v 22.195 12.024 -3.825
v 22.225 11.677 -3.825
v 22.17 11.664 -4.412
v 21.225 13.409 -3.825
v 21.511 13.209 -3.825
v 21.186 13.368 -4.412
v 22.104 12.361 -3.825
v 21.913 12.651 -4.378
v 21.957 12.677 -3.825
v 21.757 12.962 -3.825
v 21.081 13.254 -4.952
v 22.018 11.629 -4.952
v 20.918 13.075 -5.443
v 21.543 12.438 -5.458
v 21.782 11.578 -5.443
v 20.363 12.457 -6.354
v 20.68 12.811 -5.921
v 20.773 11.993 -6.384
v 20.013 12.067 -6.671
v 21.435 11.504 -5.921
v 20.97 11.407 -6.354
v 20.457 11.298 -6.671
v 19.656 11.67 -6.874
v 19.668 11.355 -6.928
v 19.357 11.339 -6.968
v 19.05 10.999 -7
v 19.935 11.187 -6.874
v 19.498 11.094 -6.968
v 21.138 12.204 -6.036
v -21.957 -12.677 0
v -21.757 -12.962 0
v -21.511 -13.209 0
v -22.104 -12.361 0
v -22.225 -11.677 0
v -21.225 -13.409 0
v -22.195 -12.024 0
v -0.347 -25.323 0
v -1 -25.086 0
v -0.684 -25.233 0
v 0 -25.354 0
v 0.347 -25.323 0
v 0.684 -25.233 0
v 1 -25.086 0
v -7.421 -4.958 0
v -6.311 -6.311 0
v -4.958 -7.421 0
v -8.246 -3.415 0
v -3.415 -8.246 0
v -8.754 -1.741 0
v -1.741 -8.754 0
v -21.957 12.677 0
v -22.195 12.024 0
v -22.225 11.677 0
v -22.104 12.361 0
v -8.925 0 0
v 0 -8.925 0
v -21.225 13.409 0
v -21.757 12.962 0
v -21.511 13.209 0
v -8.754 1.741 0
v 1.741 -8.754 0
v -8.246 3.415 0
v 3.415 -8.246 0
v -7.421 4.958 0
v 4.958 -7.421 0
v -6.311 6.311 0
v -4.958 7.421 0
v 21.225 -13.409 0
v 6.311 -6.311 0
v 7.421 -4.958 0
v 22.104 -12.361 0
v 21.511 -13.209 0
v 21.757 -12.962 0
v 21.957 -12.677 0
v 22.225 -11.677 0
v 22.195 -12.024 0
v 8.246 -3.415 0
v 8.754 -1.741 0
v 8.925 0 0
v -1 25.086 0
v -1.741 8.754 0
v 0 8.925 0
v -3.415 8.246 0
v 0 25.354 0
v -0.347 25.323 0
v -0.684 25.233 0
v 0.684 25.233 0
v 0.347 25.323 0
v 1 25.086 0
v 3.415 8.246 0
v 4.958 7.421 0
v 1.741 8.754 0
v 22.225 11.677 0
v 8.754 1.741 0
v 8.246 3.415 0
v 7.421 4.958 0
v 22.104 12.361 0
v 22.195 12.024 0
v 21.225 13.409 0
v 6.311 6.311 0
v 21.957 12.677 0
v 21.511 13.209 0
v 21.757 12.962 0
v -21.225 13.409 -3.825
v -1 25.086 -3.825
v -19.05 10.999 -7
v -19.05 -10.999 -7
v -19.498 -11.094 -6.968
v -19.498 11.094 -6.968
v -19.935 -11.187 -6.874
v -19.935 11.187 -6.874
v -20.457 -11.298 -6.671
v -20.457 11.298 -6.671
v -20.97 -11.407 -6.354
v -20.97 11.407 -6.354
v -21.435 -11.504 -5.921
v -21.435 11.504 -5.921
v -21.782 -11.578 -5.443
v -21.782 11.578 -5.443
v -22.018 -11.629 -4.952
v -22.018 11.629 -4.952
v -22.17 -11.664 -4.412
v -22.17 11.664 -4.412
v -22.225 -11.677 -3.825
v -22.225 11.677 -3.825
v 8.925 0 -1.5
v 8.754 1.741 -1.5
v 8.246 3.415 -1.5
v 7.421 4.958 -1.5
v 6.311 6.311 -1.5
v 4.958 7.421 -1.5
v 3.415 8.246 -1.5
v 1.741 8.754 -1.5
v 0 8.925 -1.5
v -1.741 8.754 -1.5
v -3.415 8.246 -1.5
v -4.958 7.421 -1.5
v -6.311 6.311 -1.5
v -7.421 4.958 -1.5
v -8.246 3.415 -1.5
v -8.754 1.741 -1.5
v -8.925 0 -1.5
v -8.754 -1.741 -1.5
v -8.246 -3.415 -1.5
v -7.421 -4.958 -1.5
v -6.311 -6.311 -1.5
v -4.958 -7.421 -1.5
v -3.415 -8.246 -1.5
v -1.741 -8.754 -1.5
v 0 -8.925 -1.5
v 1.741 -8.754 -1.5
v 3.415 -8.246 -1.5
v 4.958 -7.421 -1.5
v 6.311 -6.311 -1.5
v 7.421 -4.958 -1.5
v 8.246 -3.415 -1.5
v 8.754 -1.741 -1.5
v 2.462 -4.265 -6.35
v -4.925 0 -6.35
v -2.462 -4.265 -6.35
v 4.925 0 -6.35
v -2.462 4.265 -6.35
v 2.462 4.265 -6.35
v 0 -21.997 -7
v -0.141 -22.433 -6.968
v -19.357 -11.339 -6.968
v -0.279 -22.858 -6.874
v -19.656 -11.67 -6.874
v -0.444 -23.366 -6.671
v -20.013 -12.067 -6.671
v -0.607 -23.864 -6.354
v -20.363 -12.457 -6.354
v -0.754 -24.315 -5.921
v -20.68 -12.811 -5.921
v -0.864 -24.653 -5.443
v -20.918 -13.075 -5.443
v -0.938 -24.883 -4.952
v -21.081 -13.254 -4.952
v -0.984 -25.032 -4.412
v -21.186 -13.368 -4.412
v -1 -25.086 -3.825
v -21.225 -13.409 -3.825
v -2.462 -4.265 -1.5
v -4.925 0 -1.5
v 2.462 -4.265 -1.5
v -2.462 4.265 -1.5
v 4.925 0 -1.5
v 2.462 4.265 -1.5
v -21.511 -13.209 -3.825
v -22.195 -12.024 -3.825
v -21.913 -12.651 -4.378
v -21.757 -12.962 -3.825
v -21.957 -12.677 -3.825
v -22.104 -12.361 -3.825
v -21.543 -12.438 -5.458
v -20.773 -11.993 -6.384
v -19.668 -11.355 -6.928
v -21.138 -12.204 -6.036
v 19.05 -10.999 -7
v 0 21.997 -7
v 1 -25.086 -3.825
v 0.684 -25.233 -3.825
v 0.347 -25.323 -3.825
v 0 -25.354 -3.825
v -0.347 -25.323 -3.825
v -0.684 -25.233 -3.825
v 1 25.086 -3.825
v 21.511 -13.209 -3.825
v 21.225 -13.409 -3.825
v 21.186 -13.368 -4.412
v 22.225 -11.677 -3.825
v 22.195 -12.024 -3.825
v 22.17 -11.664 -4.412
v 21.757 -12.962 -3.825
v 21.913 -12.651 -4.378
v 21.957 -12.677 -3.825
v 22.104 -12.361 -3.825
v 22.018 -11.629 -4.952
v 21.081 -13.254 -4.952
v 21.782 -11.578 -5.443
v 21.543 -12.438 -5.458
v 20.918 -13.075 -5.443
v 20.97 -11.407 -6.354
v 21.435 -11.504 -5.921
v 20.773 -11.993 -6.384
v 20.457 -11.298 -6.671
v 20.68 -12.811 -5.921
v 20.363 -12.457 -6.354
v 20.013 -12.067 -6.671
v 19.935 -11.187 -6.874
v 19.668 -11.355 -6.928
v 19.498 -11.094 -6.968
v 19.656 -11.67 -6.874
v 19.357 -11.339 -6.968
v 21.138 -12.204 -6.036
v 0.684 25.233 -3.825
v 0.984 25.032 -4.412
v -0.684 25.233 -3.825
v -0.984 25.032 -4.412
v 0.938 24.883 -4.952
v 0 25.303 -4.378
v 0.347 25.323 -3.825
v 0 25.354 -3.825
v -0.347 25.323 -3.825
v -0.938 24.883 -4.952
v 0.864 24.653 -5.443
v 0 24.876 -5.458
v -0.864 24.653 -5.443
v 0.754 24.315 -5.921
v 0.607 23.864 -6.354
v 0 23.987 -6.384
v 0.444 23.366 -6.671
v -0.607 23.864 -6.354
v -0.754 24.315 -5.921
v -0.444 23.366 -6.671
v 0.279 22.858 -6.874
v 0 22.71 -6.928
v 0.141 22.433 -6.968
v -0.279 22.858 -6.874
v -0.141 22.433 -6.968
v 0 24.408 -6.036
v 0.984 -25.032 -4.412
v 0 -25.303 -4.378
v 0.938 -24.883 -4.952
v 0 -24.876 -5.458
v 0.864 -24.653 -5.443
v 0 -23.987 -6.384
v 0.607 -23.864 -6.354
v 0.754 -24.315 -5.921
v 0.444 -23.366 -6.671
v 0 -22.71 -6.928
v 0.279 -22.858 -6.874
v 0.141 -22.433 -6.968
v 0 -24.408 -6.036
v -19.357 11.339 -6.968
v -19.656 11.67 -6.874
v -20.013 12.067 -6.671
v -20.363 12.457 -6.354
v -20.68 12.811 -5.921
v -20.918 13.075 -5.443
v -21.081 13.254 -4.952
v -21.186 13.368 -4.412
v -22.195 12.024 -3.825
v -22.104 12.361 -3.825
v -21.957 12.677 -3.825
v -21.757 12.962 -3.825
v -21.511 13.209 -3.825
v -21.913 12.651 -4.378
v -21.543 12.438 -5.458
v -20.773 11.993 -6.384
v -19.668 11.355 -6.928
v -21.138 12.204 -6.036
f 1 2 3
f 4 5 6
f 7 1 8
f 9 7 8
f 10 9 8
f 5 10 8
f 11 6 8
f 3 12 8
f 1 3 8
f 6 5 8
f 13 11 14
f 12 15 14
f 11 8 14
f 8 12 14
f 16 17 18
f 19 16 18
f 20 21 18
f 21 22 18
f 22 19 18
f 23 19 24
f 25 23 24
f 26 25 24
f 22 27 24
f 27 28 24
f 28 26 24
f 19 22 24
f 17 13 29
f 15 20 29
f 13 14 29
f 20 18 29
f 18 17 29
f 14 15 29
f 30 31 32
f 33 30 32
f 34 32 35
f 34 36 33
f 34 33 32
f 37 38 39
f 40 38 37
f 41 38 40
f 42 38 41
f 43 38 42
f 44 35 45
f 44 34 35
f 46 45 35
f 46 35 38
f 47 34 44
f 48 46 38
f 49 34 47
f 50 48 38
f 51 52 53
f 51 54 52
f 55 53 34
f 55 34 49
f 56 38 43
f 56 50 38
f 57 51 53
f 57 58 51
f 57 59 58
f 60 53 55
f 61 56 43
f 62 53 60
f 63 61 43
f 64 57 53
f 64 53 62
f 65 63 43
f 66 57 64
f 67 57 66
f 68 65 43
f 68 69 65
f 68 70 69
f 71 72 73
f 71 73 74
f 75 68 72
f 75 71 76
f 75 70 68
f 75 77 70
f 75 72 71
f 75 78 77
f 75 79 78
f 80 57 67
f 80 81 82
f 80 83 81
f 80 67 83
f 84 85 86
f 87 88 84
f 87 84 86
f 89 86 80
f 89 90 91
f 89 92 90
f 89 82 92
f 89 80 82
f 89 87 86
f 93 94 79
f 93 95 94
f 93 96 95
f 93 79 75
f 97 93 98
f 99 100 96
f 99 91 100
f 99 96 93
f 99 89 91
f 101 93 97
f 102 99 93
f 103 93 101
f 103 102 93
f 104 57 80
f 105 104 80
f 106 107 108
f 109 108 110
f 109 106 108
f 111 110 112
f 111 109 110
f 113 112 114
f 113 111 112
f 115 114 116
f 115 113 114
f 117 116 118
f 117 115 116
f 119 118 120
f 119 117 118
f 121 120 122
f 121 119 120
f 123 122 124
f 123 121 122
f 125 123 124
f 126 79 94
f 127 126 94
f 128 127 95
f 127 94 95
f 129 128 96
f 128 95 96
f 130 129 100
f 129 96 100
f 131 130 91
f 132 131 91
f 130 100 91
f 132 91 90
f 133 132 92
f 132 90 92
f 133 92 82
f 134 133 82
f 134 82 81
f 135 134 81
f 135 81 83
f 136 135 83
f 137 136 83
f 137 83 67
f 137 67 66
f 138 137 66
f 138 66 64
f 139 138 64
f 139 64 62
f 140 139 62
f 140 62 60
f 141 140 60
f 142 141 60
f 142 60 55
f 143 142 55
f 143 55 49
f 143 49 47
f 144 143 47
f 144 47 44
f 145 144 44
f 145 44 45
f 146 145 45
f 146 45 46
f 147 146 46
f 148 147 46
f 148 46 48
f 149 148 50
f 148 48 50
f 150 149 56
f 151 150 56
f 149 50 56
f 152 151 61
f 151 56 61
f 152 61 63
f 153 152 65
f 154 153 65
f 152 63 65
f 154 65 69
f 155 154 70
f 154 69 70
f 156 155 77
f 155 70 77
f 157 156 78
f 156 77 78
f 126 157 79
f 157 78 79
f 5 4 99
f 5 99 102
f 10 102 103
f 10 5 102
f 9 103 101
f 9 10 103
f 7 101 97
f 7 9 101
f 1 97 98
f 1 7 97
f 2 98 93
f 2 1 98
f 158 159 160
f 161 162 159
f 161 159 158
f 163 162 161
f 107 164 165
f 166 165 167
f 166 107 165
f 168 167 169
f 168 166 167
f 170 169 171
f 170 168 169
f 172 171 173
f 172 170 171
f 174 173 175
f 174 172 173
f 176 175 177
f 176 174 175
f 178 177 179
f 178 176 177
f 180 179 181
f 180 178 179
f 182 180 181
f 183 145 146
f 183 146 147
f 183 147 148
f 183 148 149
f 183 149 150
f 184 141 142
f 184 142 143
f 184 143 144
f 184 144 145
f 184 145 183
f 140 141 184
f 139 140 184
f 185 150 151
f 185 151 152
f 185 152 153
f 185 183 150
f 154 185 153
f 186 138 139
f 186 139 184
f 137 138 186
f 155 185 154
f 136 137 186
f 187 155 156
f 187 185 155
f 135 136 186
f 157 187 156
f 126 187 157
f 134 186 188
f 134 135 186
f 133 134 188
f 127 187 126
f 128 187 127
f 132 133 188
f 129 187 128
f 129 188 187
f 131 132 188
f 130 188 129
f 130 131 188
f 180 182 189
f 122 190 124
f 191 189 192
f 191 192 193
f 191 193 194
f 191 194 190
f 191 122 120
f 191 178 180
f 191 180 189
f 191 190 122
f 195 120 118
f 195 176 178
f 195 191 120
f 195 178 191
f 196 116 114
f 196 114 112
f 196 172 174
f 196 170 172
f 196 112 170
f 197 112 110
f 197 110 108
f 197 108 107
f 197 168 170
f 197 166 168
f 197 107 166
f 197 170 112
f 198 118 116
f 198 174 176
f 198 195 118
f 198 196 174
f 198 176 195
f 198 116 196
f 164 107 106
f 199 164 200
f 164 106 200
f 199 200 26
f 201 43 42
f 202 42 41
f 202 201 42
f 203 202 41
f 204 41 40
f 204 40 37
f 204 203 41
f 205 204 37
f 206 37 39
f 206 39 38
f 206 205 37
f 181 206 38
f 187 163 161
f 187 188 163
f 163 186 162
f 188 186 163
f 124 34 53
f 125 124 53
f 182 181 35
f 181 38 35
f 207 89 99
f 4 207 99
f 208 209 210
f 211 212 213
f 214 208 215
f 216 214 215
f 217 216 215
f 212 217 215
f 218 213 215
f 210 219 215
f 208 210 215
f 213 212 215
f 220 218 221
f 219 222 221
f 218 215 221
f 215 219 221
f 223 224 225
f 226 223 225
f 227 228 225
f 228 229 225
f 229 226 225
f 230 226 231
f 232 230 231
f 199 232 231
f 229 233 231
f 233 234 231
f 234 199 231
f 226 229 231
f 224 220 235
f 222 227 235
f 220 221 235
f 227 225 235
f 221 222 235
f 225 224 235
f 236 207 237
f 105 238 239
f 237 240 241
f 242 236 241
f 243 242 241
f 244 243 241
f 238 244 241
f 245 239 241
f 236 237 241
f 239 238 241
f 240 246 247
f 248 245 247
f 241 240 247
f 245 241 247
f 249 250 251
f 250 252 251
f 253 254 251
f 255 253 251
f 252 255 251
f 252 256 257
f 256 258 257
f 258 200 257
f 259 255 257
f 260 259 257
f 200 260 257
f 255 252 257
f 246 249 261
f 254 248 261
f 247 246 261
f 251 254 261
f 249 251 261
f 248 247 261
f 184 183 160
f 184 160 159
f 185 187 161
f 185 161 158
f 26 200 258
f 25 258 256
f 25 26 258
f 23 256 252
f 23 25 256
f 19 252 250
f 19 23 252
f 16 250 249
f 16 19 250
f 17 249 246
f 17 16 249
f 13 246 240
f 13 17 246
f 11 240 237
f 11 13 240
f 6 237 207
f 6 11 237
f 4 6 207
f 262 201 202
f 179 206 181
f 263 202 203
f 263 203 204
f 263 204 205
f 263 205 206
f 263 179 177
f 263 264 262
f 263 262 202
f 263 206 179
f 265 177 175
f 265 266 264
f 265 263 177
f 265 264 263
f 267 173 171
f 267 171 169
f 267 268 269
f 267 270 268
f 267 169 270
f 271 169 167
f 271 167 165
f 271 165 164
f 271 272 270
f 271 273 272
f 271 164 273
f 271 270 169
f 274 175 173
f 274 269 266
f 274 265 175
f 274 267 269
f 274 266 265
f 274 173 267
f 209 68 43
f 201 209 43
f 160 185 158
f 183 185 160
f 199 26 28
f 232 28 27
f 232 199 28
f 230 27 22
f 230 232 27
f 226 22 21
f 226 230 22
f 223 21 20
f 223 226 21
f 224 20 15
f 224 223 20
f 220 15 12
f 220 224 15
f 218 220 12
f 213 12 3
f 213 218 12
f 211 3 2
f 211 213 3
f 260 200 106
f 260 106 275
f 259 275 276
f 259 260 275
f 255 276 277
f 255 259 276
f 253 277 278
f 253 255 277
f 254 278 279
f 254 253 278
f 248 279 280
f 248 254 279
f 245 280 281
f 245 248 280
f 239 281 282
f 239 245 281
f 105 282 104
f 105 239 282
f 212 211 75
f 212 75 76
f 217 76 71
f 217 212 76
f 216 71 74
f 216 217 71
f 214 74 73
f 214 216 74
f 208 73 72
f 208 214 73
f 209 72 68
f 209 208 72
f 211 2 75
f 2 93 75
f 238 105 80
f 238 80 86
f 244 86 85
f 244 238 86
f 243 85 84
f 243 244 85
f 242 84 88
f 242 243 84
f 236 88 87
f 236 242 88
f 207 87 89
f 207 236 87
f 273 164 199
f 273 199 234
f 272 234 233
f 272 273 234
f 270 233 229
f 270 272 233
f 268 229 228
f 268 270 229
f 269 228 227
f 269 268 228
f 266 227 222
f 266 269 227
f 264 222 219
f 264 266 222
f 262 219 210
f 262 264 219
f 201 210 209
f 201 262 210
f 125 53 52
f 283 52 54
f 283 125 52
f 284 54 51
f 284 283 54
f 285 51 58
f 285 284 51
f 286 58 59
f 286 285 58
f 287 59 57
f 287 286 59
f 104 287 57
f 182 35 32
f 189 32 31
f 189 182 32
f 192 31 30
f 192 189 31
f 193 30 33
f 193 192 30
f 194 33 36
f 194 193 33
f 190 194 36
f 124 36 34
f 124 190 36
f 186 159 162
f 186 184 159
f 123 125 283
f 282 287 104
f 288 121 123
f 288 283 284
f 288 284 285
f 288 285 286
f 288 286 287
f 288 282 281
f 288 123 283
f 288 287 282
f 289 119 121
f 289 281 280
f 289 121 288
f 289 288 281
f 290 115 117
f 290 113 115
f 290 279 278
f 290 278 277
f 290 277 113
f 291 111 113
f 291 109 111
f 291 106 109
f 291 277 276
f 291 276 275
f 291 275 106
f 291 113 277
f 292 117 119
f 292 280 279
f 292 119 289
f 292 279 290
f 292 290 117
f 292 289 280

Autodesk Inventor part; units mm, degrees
ref_plane "YZ Plane" through (0, 0, 0) normal (1, 0, 0) x (0, 1, 0)
ref_plane "XZ Plane" through (0, 0, 0) normal (0, 1, 0) x (-1, 0, 0)
ref_plane "XY Plane" through (0, 0, 0) normal (0, 0, 1) x (1, 0, 0)
sketch "BaseProfile" plane through (0, 0, 0) normal (0, 0, 1) x (1, 0, 0)
  circle A0 centre (0, 0) radius 4.925
  circle A1 centre (0, 0) radius 8.925
  line L0 (22.225, -12.8316) -> (0, -25.6632)
  line L1 (0, -25.6632) -> (-22.225, -12.8316)
  line L2 (-22.225, -12.8316) -> (-22.225, 12.8316)
  line L3 (-22.225, 12.8316) -> (0, 25.6632)
  line L4 (0, 25.6632) -> (22.225, 12.8316)
  line L5 (22.225, 12.8316) -> (22.225, -12.8316)
  line L6 (0, -35.9285) -> (0, 35.9285) construction
  line L7 (2.4625, 4.2652) -> (4.925, 0)
  line L8 (4.925, 0) -> (2.4625, -4.2652)
  line L9 (2.4625, -4.2652) -> (-2.4625, -4.2652)
  line L10 (-2.4625, -4.2652) -> (-4.925, 0)
  line L11 (-4.925, 0) -> (-2.4625, 4.2652)
  line L12 (-2.4625, 4.2652) -> (2.4625, 4.2652)
  dimension "d0" = 9.85
  dimension "d1" = 17.85
  dimension "d2" = 44.45
extrude "Extrusion1" add sketch "BaseProfile" against normal blind 7 contours L7 A0 | L8 L9 L10 L11 L12 L7 | A0 L8 | L12 A0 | A0 L9 | L11 A0 | A0 L10 | A1 | L0 L1 L2 L3 L4 L5
extrude "Extrusion2" cut sketch "BaseProfile" against normal blind 1.5 contours L7 A0 | L8 L9 L10 L11 L12 L7 | A0 L8 | L12 A0 | A0 L9 | L11 A0 | A0 L10 | A1
extrude "Extrusion4" cut sketch "BaseProfile" against normal blind 6.35 contours L8 L9 L10 L11 L12 L7
fillet "Fillet1" radius 3.175 6 edges at (-11.1125, -19.2474, -7) (11.1125, -19.2474, -7) (22.225, 0, -7) (-22.225, 0, -7) (-11.1125, 19.2474, -7) (11.1125, 19.2474, -7)
fillet "Fillet2" radius 2 12 edges at (21.2951, -12.2947, -6.0701) (22.225, -12.8316, -1.9125) (21.2951, 12.2947, -6.0701) (22.225, 12.8316, -1.9125) (0, -24.5894, -6.0701) (0, -25.6632, -1.9125) (-21.2951, -12.2947, -6.0701) (-22.225, -12.8316, -1.9125) (-21.2951, 12.2947, -6.0701) (-22.225, 12.8316, -1.9125) (0, 24.5894, -6.0701) (0, 25.6632, -1.9125)
properties part number "pad"
